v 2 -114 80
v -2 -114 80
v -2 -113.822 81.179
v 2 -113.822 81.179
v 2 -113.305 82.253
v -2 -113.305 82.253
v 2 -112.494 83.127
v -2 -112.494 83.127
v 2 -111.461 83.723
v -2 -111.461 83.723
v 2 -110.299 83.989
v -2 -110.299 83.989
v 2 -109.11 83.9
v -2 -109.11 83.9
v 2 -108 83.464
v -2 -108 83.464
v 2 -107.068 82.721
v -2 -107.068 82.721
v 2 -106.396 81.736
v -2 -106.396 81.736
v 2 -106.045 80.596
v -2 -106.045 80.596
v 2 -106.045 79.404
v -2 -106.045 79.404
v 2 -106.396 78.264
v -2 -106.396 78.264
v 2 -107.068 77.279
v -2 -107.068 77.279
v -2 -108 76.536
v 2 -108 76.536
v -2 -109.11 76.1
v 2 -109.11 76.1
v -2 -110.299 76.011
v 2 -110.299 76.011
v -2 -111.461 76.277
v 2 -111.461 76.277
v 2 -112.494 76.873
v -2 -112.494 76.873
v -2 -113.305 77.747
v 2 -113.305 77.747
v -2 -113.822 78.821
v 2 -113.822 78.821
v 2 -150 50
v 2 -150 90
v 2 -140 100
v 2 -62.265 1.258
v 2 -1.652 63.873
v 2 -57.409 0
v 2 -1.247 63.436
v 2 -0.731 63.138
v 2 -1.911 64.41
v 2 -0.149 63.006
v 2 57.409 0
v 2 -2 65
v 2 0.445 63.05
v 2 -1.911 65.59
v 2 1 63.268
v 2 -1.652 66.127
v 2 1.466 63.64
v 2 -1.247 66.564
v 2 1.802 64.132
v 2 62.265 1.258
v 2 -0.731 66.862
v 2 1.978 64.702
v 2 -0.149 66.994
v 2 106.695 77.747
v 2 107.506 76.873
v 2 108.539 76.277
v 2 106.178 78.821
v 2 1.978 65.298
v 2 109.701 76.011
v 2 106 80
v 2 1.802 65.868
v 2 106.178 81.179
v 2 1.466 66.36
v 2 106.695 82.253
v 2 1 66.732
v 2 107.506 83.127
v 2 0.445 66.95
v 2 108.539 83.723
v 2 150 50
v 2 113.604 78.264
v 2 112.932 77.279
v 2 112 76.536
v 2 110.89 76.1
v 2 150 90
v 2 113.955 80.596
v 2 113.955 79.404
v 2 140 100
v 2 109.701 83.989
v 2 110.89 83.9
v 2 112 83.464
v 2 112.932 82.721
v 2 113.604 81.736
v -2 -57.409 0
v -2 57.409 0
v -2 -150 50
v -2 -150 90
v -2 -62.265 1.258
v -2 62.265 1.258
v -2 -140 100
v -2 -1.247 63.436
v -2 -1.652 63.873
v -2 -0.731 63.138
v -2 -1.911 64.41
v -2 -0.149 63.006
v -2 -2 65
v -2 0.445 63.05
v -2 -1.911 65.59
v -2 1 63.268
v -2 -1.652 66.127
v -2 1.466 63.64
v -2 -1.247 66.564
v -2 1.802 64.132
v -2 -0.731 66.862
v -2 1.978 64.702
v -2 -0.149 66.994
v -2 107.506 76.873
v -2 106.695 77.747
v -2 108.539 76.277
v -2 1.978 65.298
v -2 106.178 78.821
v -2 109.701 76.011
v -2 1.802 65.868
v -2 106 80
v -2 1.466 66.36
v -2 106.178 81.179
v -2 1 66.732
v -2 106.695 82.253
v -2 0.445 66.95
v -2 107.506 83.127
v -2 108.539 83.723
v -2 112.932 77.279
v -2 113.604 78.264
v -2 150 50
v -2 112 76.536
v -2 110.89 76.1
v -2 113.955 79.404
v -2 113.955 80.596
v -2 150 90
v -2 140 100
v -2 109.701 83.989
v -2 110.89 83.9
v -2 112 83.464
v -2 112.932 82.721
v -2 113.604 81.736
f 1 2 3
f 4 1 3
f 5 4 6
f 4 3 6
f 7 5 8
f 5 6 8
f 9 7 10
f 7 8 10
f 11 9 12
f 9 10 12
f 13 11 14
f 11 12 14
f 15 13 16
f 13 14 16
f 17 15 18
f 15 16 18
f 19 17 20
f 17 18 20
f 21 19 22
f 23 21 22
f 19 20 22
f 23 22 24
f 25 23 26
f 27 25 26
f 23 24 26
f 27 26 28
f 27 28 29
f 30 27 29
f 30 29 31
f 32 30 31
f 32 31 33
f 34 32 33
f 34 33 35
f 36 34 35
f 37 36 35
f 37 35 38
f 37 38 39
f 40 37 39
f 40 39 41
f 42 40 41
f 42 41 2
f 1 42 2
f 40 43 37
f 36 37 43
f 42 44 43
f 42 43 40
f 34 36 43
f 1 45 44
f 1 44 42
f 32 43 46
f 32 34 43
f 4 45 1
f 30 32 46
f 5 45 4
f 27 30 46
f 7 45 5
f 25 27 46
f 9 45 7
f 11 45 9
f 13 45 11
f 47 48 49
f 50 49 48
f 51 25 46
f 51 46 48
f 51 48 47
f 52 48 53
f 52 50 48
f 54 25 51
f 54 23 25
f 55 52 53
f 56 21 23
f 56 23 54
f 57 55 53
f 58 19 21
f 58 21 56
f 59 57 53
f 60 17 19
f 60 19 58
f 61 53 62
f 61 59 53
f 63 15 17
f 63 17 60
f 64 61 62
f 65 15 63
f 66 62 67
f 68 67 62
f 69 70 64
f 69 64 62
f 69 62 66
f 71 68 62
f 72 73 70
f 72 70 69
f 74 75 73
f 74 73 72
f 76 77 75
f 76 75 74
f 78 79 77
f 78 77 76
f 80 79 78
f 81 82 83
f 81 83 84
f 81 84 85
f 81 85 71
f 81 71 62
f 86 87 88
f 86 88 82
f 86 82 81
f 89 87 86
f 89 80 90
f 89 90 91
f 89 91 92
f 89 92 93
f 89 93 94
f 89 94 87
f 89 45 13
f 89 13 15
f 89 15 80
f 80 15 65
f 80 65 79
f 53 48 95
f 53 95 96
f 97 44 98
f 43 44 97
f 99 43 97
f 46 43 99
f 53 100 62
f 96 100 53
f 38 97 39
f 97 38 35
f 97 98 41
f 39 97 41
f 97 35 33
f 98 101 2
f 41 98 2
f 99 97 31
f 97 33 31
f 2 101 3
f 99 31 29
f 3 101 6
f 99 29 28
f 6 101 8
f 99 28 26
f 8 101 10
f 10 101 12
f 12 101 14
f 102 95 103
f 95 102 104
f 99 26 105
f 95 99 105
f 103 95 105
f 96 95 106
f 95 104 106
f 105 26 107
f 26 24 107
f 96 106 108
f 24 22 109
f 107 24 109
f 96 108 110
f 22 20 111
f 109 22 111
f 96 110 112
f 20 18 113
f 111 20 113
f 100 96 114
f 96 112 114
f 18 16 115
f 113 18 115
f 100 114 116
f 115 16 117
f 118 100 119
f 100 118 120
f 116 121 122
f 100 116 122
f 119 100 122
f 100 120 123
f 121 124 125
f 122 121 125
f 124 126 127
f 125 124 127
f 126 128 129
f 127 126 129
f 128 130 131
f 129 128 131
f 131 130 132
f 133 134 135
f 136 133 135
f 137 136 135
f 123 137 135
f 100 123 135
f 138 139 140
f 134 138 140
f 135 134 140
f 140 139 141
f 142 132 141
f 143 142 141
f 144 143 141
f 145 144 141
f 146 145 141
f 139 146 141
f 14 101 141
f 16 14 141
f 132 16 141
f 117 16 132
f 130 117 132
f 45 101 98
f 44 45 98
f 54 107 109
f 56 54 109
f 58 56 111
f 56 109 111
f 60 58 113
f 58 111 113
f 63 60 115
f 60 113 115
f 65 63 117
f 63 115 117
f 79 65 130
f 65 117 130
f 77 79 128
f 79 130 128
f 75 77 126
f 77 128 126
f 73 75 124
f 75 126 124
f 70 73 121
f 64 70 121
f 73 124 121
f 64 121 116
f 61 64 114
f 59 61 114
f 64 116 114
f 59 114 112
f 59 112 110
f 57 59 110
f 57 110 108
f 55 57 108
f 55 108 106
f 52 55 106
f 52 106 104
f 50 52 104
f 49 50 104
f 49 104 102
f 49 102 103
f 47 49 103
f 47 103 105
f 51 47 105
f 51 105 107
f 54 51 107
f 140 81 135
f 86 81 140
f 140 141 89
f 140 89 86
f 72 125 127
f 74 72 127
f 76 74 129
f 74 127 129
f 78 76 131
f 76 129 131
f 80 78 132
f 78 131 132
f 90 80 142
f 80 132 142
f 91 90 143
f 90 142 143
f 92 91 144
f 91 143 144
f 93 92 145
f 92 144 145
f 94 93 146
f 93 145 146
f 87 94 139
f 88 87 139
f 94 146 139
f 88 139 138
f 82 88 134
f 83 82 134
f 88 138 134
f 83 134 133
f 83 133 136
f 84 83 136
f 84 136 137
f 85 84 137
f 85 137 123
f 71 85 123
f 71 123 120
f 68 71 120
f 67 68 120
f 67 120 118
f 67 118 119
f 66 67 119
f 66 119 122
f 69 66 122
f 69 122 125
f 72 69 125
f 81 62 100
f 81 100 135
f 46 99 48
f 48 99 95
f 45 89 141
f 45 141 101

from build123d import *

# Parameters (mm, degrees)
F1_DEPTH    = 2
F3_D        = 8
F5_T1_DEPTH = 55.4336597593
F5_T3_DEPTH = 18.9008056118
F6_D        = 4


# Not quite as in the source:
# - a fillet or chamfer that OpenCascade refuses, or shapes differently, is made with other operations: its cross-section is extruded or revolved along the edge and cut away or added
# - a feature of the source that left no trace in its solid (it failed there, or was rolled back) is left out


with BuildPart() as f1:
    # F0 (on Right) → F1 (new body, symmetric)
    with BuildSketch(Plane.YZ):
        Polygon((150, 100), (-150, 100), (-150, 50), (-60, 0), (60, 0), (150, 50), align=None)
    extrude(amount=F1_DEPTH, both=True)

    # F3 (through all)
    with Locations(Plane.YZ.offset(2)):
        with Locations((-110, 80), (110, 80)):
            Hole(F3_D / 2)

    # F5: chamfer of 10 on 4 edges, made by hand

    # F5_s2 → F5_t1 (cut)
    with BuildSketch(Plane.YZ.offset(-27.7168298797)):
        Polygon((140, 100), (150, 90), (150, 100), align=None)
        Polygon((-140, 100), (-150, 90), (-150, 100), align=None)
    extrude(amount=F5_T1_DEPTH, mode=Mode.SUBTRACT)

    # F5_s4 → F5_t3 (cut)
    with BuildSketch(Plane.YZ.offset(-9.4504028059)):
        Polygon((-62.2651690298, 1.2584272388), (-57.408739718, 0), (-60, 0), align=None)
        Polygon((62.2651690298, 1.2584272388), (57.408739718, 0), (60, 0), align=None)
    extrude(amount=F5_T3_DEPTH, mode=Mode.SUBTRACT)

    # F6 (through all)
    with Locations(Plane.YZ.offset(2)):
        with Locations((0, 65)):
            Hole(F6_D / 2)


solid = f1.part
